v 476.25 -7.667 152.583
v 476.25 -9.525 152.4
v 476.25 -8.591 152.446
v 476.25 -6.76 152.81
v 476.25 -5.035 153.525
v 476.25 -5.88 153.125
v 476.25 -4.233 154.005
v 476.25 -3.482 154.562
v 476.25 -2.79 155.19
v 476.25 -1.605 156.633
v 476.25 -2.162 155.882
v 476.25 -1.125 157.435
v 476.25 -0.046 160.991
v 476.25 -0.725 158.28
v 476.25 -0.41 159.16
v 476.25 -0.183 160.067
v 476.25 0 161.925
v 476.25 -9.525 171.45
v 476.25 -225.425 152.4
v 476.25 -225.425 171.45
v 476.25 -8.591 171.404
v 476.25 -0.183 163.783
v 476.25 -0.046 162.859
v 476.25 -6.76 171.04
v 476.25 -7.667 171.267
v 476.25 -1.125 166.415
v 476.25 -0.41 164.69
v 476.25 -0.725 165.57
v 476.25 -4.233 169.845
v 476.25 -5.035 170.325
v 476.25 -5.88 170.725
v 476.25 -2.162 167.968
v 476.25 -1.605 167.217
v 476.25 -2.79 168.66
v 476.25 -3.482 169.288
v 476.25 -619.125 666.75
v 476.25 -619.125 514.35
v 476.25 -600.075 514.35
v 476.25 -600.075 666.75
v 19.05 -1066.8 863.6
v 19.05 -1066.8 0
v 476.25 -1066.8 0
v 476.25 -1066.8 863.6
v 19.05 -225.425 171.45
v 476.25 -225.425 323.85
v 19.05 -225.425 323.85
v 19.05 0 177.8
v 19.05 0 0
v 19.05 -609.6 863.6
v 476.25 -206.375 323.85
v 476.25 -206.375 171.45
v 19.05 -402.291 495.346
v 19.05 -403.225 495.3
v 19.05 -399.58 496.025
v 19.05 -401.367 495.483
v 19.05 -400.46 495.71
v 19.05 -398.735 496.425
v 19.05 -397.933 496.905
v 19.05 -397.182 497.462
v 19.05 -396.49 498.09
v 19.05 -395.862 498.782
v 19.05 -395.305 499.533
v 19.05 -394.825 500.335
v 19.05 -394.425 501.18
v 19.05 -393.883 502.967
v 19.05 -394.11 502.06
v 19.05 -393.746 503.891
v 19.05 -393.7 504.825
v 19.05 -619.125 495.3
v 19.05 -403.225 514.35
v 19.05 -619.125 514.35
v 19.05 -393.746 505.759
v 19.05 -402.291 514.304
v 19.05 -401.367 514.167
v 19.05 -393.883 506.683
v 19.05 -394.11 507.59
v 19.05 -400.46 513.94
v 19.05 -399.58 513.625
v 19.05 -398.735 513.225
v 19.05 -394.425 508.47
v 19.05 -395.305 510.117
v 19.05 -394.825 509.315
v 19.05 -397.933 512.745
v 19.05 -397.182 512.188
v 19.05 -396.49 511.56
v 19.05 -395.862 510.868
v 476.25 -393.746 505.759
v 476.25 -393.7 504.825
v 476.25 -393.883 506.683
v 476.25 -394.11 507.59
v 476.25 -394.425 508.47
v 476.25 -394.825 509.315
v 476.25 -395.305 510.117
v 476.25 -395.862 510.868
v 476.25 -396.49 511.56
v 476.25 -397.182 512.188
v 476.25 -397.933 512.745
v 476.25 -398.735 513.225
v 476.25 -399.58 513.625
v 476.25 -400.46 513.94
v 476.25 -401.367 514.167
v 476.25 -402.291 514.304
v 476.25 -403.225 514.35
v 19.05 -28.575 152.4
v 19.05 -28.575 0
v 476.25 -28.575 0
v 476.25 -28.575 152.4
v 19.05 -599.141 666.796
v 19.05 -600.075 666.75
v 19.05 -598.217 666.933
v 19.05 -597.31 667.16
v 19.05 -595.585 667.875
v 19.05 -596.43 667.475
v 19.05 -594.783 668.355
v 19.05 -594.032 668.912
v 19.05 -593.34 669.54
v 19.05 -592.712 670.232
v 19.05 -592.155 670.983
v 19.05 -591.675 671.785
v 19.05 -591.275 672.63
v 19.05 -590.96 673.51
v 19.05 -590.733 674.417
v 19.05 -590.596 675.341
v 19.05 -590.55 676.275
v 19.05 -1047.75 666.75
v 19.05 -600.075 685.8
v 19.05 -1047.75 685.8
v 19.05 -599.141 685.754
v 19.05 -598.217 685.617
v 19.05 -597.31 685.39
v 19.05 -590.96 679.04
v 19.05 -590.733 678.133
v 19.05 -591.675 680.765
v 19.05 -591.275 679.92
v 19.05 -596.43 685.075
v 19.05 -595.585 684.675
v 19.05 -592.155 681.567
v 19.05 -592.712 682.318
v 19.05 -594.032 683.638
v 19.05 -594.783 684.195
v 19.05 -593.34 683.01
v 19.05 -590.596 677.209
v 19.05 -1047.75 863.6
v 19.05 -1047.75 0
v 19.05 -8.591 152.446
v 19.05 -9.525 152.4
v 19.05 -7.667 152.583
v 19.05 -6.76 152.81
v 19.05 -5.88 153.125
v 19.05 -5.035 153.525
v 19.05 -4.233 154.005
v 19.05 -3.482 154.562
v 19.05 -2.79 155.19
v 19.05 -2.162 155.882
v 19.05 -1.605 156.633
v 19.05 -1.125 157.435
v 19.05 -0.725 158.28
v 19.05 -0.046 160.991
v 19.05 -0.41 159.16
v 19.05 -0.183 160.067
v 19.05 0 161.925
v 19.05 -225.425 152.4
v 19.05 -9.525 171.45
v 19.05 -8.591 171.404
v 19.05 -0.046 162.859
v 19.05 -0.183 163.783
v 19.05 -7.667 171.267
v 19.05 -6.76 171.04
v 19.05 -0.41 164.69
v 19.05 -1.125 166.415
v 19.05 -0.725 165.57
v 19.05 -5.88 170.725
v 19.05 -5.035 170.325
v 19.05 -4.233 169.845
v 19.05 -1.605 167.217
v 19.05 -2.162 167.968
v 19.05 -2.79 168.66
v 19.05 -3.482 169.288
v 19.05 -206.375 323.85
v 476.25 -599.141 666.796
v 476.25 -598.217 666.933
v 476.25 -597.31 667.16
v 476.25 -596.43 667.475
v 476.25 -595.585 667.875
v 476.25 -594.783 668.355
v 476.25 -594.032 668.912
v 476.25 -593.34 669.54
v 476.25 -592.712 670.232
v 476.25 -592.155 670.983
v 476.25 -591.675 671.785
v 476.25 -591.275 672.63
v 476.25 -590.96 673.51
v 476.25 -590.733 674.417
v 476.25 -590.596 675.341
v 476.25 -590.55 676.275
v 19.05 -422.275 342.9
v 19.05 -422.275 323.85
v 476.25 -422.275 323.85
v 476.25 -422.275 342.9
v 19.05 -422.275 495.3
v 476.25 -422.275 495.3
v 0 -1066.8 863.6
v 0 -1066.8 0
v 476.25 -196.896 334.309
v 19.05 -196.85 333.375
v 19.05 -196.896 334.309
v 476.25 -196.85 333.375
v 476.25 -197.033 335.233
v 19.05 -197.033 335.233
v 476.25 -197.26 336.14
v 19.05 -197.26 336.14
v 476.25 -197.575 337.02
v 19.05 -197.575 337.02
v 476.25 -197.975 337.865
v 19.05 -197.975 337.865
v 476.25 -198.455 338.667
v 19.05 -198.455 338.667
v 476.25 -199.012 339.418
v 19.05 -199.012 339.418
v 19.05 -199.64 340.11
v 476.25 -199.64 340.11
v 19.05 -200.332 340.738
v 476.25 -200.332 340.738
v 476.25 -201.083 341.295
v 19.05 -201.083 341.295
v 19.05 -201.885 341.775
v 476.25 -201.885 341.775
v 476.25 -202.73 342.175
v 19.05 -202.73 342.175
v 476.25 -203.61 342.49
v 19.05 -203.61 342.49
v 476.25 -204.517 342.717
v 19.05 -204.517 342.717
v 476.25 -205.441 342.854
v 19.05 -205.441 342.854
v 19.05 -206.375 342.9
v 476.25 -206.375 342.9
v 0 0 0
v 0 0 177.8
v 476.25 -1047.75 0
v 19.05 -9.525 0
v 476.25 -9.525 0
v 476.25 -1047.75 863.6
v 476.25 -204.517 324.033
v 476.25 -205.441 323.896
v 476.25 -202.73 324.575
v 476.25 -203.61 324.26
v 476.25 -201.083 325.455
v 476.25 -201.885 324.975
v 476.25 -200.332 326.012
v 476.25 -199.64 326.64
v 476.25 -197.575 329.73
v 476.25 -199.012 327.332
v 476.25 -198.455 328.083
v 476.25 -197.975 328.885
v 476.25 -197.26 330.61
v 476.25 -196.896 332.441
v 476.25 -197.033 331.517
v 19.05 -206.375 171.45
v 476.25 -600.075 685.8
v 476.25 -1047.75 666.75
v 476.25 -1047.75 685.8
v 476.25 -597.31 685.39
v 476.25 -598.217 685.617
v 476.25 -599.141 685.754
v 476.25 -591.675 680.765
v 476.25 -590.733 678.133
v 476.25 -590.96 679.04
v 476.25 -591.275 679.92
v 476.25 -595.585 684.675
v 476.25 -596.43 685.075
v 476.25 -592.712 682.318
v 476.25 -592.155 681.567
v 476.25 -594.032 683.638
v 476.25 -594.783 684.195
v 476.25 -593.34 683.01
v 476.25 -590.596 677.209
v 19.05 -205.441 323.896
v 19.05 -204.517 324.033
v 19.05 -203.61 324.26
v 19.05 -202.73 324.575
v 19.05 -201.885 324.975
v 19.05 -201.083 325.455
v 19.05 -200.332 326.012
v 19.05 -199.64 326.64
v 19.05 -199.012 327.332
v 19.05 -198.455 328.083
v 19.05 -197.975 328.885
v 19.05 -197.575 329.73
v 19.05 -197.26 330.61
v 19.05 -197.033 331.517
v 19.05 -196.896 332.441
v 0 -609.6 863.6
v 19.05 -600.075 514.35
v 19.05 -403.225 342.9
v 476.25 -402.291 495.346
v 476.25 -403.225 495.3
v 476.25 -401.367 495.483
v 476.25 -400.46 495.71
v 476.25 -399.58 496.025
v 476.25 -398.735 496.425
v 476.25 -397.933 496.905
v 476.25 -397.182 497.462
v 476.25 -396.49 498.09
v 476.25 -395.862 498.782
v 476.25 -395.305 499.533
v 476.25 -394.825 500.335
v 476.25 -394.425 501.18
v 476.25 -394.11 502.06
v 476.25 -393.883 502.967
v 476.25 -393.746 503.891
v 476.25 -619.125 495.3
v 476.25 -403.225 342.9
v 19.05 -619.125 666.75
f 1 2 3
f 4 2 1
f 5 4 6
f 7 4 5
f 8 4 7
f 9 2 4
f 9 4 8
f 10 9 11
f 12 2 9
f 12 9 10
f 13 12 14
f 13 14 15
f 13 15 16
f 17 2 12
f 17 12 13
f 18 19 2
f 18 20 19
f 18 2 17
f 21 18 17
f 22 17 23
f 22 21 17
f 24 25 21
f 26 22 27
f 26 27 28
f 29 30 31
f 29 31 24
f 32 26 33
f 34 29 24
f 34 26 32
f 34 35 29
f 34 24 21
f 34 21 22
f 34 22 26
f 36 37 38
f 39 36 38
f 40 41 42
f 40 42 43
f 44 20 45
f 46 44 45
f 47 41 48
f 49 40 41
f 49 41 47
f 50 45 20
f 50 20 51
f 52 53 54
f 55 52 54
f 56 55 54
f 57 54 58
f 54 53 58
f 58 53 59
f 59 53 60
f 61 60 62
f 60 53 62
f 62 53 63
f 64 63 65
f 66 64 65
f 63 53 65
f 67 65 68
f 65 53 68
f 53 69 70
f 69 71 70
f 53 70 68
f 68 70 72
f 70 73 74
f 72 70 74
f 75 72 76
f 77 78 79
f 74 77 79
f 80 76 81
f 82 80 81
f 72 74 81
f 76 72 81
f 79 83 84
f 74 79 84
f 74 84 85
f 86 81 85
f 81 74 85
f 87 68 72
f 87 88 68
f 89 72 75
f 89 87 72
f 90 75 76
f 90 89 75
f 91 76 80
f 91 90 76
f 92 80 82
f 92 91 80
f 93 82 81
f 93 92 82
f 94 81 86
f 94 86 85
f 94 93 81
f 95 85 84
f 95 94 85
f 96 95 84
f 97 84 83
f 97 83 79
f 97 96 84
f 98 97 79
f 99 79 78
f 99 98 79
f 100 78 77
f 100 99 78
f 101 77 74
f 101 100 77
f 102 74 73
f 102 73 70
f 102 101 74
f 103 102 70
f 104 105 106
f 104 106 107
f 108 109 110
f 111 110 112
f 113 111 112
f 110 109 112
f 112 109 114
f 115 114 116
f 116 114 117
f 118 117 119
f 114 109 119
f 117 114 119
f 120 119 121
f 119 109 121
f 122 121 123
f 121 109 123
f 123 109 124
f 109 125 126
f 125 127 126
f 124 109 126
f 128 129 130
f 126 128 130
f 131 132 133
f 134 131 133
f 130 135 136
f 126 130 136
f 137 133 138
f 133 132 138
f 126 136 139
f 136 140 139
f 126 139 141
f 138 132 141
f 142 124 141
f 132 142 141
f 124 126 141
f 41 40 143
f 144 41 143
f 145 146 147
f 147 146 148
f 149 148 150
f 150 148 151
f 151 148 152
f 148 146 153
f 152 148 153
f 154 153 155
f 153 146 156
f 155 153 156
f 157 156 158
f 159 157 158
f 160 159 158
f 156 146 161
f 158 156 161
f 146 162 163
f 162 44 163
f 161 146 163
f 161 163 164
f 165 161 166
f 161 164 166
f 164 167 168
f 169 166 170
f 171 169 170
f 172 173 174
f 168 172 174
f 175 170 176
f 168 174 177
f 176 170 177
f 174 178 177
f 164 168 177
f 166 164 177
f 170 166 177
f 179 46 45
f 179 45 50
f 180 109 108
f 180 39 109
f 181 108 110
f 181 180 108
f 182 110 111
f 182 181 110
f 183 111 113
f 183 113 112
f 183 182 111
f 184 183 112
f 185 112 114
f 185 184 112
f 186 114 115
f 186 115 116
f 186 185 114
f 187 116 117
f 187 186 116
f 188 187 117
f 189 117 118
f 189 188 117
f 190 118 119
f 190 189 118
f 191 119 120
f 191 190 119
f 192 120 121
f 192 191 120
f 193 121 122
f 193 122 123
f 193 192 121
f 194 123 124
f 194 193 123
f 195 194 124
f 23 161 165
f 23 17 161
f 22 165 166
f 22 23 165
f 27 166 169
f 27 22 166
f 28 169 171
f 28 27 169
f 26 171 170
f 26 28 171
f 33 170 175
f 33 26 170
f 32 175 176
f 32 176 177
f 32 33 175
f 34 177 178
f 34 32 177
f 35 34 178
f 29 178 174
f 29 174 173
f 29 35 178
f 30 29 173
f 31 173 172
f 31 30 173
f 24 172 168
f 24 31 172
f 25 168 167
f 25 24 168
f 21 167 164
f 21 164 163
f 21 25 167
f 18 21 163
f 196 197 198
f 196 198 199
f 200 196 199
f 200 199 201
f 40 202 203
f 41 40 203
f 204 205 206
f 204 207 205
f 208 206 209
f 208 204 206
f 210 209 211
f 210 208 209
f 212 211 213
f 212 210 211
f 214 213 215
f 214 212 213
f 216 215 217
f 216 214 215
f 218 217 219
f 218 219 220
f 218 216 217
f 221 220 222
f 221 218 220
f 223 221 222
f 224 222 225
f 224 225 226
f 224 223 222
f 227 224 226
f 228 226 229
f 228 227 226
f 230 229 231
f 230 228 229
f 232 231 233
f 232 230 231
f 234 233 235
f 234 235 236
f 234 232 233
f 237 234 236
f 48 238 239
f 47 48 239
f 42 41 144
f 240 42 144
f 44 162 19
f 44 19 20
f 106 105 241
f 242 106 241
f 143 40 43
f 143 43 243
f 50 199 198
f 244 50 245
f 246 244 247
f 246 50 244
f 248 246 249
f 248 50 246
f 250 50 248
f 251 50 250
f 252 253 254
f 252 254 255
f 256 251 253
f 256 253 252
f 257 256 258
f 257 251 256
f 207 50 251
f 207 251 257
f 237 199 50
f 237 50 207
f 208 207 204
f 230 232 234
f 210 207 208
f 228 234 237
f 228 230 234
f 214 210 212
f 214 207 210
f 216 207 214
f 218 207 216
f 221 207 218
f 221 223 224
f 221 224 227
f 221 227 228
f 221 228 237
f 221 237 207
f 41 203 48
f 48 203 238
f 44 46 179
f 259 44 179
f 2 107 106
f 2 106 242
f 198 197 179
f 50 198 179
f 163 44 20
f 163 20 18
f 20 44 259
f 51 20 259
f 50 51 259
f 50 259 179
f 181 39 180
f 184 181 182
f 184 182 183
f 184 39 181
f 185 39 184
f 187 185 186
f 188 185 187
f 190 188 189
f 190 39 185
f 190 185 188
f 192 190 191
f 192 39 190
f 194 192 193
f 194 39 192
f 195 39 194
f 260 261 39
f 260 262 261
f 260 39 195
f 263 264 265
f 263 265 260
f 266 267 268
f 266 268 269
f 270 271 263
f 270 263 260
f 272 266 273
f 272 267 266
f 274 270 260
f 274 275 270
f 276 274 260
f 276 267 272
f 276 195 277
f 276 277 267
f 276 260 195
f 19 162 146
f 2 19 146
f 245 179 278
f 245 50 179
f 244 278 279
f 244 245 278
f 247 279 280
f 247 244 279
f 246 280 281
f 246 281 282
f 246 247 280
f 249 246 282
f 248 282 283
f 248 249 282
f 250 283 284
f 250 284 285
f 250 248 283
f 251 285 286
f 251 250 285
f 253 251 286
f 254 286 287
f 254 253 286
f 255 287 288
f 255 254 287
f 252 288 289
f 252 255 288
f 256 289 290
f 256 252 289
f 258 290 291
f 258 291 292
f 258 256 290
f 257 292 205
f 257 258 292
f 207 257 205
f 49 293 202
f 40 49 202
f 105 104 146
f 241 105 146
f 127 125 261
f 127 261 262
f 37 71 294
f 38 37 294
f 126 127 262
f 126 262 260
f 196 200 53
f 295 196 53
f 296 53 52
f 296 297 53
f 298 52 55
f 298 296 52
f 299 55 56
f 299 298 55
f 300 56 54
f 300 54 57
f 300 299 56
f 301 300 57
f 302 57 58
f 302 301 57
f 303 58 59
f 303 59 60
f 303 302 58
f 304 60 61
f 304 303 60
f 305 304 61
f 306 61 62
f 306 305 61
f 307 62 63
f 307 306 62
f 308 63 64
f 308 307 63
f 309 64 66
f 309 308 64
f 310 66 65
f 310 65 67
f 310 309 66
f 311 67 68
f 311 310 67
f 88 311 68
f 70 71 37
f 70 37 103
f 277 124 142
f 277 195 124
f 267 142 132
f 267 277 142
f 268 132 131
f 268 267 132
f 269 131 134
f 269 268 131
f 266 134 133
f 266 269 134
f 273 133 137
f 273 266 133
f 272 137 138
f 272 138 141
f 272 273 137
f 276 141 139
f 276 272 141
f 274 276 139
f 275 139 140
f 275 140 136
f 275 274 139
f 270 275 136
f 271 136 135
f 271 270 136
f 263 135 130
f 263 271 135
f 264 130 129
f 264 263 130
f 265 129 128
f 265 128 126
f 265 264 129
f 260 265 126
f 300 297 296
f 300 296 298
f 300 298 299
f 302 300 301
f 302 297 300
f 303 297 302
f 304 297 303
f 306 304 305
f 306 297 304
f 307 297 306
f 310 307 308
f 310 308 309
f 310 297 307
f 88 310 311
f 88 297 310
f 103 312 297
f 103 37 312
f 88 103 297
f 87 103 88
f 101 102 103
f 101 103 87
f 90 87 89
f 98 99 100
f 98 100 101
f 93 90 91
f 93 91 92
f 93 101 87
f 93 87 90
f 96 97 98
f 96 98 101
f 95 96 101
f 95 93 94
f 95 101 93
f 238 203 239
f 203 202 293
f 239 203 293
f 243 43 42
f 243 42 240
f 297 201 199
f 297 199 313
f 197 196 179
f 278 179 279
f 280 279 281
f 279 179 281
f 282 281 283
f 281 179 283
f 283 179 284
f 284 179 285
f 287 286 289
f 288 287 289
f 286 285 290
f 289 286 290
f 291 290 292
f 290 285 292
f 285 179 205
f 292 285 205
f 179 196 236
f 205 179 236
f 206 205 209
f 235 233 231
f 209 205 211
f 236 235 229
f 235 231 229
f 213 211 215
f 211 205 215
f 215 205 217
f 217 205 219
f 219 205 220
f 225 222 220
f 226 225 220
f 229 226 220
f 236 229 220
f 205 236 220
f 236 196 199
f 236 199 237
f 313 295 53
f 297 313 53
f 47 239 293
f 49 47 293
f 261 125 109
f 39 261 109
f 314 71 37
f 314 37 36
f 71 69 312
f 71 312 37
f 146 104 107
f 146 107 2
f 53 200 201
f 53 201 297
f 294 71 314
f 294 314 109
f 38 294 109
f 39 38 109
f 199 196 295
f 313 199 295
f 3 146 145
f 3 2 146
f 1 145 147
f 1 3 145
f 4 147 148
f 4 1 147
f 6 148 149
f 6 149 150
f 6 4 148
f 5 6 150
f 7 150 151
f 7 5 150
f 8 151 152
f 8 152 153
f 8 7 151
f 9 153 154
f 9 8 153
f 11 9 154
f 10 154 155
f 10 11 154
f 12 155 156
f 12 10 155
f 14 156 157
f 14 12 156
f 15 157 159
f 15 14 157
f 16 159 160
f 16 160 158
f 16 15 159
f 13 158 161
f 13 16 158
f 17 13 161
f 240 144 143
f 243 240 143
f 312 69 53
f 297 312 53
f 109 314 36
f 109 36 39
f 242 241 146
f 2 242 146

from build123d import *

# Parameters (mm, degrees)
F1_DEPTH = 19.05
F2_W     = 19.05
F2_H     = 863.6
F3_DEPTH = 457.2
F4_W     = 457.2
F4_H     = 19.05
F5_DEPTH = 457.2
F4_W_2   = 225.425
F6_R     = 9.52499
F6_2_R   = 9.52499
F6_3_R   = 9.52499
F6_4_R   = 9.52499
F7_W     = 19.05
F7_H     = 152.4
F8_DEPTH = 457.2


# Not quite as in the source:
# - a fillet or chamfer is up to 0.001 mm smaller than in the source, because OpenCascade refuses the exact size


with BuildPart() as f1:
    # F0 (on Right) → F1 (new body)
    with BuildSketch(Plane.YZ):
        Polygon((-609.6, 863.6), (-1066.8, 863.6), (-1066.8, 0), (0, 0), (0, 177.8), align=None)
    extrude(amount=F1_DEPTH)


with BuildPart() as f3:
    # F2 (on face) → F3 (new body)
    with BuildSketch(Plane.YZ.offset(19.05)):
        with Locations((-1057.275, 431.8)):
            Rectangle(F2_W, F2_H)
    extrude(amount=F3_DEPTH)


with BuildPart() as f5:
    # F4 (on face) → F5 (new body, through all)
    with BuildSketch(Plane.YZ.offset(19.05)):
        with Locations((-819.15, 676.275)):
            Rectangle(F4_W, F4_H)
    extrude(amount=F5_DEPTH)

    # F6 (radius 9.525 in the source; OpenCascade refuses exactly that, so slightly less here)
    f6_edges = [f5.edges().sort_by_distance(p)[0] for p in [
        (247.65, -590.55, 685.8),
        (247.65, -590.55, 666.75),
    ]]
    fillet(f6_edges, radius=F6_R)


with BuildPart() as f5b:
    # F4 (on face) → F5, piece 2 (new body, through all)
    with BuildSketch(Plane.YZ.offset(19.05)):
        with Locations((-112.7125, 161.925)):
            Rectangle(F4_W_2, F4_H)
    extrude(amount=F5_DEPTH)

    # F6#4 (radius 9.525 in the source; OpenCascade refuses exactly that, so slightly less here)
    f6_4_edges = [f5b.edges().sort_by_distance(p)[0] for p in [
        (247.65, 0, 171.45),
        (247.65, 0, 152.4),
    ]]
    fillet(f6_4_edges, radius=F6_4_R)


with BuildPart() as f5c:
    # F4 (on face) → F5, piece 3 (new body, through all)
    with BuildSketch(Plane.YZ.offset(19.05)):
        with Locations((-309.5625, 333.375)):
            Rectangle(F4_W_2, F4_H)
    extrude(amount=F5_DEPTH)

    # F6#3 (radius 9.525 in the source; OpenCascade refuses exactly that, so slightly less here)
    f6_3_edges = [f5c.edges().sort_by_distance(p)[0] for p in [
        (247.65, -196.85, 342.9),
        (247.65, -196.85, 323.85),
    ]]
    fillet(f6_3_edges, radius=F6_3_R)


with BuildPart() as f5d:
    # F4 (on face) → F5, piece 4 (new body, through all)
    with BuildSketch(Plane.YZ.offset(19.05)):
        with Locations((-506.4125, 504.825)):
            Rectangle(F4_W_2, F4_H)
    extrude(amount=F5_DEPTH)

    # F6#2 (radius 9.525 in the source; OpenCascade refuses exactly that, so slightly less here)
    f6_2_edges = [f5d.edges().sort_by_distance(p)[0] for p in [
        (247.65, -393.7, 514.35),
        (247.65, -393.7, 495.3),
    ]]
    fillet(f6_2_edges, radius=F6_2_R)


with BuildPart() as f8:
    # F7 (on face) → F8 (new body, through all)
    with BuildSketch(Plane.YZ.offset(19.05)):
        with Locations((-609.6, 590.55)):
            Rectangle(F7_W, F7_H)
    extrude(amount=F8_DEPTH)


with BuildPart() as f8b:
    # F7 (on face) → F8, piece 2 (new body, through all)
    with BuildSketch(Plane.YZ.offset(19.05)):
        with Locations((-412.75, 419.1)):
            Rectangle(F7_W, F7_H)
    extrude(amount=F8_DEPTH)


with BuildPart() as f8c:
    # F7 (on face) → F8, piece 3 (new body, through all)
    with BuildSketch(Plane.YZ.offset(19.05)):
        with Locations((-215.9, 247.65)):
            Rectangle(F7_W, F7_H)
    extrude(amount=F8_DEPTH)


with BuildPart() as f8d:
    # F7 (on face) → F8, piece 4 (new body, through all)
    with BuildSketch(Plane.YZ.offset(19.05)):
        with Locations((-19.05, 76.2)):
            Rectangle(F7_W, F7_H)
    extrude(amount=F8_DEPTH)


solid = Compound([f1.part, f3.part, f5.part, f5b.part, f5c.part, f5d.part, f8.part, f8b.part, f8c.part, f8d.part])
